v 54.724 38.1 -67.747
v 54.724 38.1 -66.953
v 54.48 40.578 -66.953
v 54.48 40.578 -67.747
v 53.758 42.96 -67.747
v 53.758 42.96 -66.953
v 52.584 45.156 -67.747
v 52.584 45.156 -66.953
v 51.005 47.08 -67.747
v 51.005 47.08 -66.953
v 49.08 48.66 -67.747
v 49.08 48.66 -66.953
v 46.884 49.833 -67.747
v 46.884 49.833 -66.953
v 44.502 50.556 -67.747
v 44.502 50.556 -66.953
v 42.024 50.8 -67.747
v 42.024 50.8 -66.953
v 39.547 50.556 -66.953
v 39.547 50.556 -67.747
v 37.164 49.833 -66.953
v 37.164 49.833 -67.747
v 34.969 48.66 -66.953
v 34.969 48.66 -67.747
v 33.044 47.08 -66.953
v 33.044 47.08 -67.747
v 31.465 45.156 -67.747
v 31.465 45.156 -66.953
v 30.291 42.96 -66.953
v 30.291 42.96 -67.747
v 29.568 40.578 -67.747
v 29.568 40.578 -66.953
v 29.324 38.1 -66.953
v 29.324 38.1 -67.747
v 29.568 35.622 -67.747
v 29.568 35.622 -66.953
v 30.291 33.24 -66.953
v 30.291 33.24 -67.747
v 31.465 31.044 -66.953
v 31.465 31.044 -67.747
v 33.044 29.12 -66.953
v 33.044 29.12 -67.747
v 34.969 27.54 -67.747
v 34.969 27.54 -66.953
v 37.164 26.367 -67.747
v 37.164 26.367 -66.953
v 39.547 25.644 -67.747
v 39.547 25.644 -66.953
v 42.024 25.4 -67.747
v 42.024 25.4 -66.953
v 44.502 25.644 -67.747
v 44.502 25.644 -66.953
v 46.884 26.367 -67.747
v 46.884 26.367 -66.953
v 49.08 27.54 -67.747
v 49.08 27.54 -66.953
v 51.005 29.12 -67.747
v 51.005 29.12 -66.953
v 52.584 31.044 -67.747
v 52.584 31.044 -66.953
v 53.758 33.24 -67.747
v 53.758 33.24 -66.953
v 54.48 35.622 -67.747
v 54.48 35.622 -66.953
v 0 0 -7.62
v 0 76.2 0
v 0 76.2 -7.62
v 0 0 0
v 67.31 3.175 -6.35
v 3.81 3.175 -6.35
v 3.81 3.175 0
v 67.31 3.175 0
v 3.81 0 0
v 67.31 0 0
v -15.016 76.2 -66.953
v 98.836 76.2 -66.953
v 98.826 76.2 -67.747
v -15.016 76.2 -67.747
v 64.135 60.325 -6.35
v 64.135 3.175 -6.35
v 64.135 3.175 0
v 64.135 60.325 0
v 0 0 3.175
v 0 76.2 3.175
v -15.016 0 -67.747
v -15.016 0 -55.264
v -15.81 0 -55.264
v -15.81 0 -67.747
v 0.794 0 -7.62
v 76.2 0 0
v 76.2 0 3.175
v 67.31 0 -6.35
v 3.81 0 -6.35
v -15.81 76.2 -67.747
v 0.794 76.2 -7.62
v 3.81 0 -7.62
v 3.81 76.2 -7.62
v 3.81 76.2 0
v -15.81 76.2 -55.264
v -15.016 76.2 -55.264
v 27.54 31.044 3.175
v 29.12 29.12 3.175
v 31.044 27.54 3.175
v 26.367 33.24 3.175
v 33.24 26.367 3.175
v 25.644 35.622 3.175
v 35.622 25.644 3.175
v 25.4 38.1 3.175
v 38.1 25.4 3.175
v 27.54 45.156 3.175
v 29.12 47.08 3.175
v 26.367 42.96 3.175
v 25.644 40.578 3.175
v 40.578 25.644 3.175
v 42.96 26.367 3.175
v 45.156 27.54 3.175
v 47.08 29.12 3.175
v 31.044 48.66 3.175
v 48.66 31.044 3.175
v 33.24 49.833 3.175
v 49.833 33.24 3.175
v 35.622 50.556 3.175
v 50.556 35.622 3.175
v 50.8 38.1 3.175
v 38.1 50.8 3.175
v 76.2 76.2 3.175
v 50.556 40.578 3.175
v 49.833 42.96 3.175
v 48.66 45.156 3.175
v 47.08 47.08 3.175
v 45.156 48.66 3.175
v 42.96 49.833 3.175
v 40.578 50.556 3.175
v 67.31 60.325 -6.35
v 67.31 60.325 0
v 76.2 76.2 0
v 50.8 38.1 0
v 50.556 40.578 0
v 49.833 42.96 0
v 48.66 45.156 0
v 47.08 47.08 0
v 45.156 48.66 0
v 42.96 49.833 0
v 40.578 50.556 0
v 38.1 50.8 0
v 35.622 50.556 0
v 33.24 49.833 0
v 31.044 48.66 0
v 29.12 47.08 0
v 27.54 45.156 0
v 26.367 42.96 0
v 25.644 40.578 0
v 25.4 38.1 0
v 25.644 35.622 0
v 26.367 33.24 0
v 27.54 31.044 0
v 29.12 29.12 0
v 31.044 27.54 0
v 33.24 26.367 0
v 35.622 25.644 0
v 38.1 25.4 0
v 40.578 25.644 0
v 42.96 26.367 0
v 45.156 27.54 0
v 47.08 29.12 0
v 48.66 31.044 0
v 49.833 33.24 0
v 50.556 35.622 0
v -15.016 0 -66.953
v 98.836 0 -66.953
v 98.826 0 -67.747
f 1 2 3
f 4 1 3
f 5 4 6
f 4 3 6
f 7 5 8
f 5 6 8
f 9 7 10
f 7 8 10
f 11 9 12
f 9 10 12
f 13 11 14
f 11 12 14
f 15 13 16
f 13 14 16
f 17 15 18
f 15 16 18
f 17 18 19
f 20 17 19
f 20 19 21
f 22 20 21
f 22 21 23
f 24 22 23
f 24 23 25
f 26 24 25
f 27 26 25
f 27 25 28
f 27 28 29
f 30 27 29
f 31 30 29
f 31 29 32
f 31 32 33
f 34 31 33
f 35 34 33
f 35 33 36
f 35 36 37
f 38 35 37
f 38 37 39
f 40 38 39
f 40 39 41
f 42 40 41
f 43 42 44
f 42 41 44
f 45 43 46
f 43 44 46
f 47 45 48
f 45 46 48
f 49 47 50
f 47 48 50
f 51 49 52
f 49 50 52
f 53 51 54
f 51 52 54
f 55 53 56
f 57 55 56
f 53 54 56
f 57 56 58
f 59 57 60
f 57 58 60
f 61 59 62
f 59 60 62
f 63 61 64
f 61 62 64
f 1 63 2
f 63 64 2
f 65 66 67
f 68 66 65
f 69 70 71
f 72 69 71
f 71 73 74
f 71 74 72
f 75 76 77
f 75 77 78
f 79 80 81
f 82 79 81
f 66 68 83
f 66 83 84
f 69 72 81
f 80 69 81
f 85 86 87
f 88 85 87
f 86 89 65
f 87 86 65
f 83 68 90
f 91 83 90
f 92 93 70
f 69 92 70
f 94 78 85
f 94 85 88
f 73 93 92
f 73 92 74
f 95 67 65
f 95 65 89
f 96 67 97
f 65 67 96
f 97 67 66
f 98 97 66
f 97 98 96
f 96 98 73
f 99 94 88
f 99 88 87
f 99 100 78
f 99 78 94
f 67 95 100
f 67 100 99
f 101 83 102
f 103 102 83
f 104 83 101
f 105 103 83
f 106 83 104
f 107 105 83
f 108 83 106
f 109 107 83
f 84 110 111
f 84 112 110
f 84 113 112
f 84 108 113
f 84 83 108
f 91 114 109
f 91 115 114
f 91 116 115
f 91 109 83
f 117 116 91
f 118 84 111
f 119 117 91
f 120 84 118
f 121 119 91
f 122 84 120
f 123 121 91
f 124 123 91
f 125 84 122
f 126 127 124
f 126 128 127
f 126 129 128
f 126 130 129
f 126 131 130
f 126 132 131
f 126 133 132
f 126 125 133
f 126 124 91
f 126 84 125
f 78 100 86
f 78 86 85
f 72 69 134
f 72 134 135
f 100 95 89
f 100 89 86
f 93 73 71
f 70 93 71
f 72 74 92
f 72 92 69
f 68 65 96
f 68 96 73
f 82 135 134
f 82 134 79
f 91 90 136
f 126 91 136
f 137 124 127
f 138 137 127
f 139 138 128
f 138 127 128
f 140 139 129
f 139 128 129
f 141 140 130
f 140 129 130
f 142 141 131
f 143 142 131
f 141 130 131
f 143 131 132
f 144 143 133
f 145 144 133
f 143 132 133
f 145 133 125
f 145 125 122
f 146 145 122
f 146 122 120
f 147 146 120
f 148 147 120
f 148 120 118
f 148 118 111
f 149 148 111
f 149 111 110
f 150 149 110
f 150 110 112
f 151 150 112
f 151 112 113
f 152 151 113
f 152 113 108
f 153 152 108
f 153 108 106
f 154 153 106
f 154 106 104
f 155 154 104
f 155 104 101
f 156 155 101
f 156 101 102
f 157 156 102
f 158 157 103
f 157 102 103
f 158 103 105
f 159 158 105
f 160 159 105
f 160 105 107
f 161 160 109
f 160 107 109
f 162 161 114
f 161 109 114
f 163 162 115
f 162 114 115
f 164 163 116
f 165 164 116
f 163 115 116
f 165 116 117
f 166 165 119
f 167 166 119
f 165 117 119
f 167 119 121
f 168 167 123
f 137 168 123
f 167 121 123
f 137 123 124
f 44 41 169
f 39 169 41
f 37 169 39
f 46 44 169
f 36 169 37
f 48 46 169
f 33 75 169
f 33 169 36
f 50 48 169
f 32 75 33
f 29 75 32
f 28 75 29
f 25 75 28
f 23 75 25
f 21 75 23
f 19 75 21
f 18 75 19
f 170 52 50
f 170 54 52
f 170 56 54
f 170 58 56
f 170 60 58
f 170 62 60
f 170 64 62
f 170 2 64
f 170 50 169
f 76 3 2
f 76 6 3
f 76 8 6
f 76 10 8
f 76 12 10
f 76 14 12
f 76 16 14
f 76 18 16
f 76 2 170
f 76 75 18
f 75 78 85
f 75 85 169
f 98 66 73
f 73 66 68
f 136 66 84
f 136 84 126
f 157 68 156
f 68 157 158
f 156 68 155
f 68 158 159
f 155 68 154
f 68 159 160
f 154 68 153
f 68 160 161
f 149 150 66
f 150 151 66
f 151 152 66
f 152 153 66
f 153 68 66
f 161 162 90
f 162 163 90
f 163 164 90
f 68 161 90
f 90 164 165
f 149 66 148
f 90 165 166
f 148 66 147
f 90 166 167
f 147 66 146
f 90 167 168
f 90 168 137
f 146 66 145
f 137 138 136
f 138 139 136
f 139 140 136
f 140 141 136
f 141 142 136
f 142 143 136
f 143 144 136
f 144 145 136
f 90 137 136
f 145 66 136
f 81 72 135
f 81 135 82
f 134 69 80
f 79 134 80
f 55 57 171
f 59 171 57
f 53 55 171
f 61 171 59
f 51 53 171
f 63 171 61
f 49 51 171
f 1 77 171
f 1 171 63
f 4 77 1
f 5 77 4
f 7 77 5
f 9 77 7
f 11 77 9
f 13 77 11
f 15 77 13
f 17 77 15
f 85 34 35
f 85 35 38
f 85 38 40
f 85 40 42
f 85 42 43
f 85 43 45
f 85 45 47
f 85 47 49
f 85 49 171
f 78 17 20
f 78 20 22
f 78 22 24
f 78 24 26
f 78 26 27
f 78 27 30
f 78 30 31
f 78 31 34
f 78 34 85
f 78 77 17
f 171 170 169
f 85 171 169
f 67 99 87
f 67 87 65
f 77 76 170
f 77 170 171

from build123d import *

# Parameters (mm, degrees)
F0_W      = 76.2
F0_H      = 76.2
F1_DEPTH  = 3.175
F2_R      = 12.7
F3_DEPTH  = 3.176
F4_W      = 76.2
F4_H      = 7.62
F5_DEPTH  = 3.81
F7_W      = 3.175
F7_H      = 6.35
F8_DEPTH  = 63.5
F12_DEPTH = 76.2
F13_DEPTH = 76.2
F14_R     = 12.7
F15_DEPTH = 0.79475
F16_W     = 3.175
F16_H     = 6.35
F17_DEPTH = 57.15


# Not quite as in the source:
# - a feature names something its author has since deleted; it is built from what else it names


with BuildPart() as f1:
    # F0 (on Top) → F1 (new body)
    with BuildSketch(Plane.XY):
        with Locations((38.1, 38.1)):
            Rectangle(F0_W, F0_H)
    extrude(amount=F1_DEPTH)

    # F2 (on face) → F3 (cut, through all)
    with BuildSketch(Plane.XY.offset(3.175)):
        with Locations((38.1, 38.1)):
            Circle(F2_R)
    extrude(amount=-F3_DEPTH, mode=Mode.SUBTRACT)


with BuildPart() as f5:
    # F4 (on face) → F5 (new body)
    with BuildSketch(Plane(origin=(0, 0, 0), x_dir=(0, -1, 0), z_dir=(-1, 0, 0))):
        with Locations((-38.1, -3.81)):
            Rectangle(F4_W, F4_H)
    extrude(amount=-F5_DEPTH)


with BuildPart() as f8:
    # F7 (on face) → F8 (new body)
    with BuildSketch(Plane.YZ.offset(3.81)):
        with Locations((1.5875, -3.175)):
            Rectangle(F7_W, F7_H)
    extrude(amount=F8_DEPTH)


with BuildPart() as f12:
    # F11 (on face) → F12 (new body)
    with BuildSketch(Plane(origin=(0, 76.2, 0), x_dir=(-1, 0, 0), z_dir=(0, 1, 0))):
        Polygon((15.81023, -55.2641394734), (0, -7.62), (-0.79375, -7.62), (15.01648, -55.2641394734), (15.01648, -66.9532194734), (15.01648, -67.7469694734), (15.81023, -67.7469694734), align=None)
    extrude(amount=-F12_DEPTH)


with BuildPart() as f13:
    # F11 (on face) → F13 (new body)
    with BuildSketch(Plane(origin=(0, 76.2, 0), x_dir=(-1, 0, 0), z_dir=(0, 1, 0))):
        Polygon((15.01648, -67.7469694734), (15.01648, -66.9532194734), (-98.83648, -66.9532194734), (-98.82632, -67.7469694734), align=None)
    extrude(amount=-F13_DEPTH)

    # F14 (on face) → F15 (cut, through all)
    with BuildSketch(Plane.XY.offset(-66.9532194734)):
        with Locations((42.0243, 38.1)):
            Circle(F14_R)
    extrude(amount=-F15_DEPTH, mode=Mode.SUBTRACT)


with BuildPart() as f17:
    # F16 (on face) → F17 (new body)
    with BuildSketch(Plane(origin=(0, 3.175, 0), x_dir=(-1, 0, 0), z_dir=(0, 1, 0))):
        with Locations((-65.7225, -3.175)):
            Rectangle(F16_W, F16_H)
    extrude(amount=F17_DEPTH)


solid = Compound([f1.part, f5.part, f8.part, f12.part, f13.part, f17.part])
